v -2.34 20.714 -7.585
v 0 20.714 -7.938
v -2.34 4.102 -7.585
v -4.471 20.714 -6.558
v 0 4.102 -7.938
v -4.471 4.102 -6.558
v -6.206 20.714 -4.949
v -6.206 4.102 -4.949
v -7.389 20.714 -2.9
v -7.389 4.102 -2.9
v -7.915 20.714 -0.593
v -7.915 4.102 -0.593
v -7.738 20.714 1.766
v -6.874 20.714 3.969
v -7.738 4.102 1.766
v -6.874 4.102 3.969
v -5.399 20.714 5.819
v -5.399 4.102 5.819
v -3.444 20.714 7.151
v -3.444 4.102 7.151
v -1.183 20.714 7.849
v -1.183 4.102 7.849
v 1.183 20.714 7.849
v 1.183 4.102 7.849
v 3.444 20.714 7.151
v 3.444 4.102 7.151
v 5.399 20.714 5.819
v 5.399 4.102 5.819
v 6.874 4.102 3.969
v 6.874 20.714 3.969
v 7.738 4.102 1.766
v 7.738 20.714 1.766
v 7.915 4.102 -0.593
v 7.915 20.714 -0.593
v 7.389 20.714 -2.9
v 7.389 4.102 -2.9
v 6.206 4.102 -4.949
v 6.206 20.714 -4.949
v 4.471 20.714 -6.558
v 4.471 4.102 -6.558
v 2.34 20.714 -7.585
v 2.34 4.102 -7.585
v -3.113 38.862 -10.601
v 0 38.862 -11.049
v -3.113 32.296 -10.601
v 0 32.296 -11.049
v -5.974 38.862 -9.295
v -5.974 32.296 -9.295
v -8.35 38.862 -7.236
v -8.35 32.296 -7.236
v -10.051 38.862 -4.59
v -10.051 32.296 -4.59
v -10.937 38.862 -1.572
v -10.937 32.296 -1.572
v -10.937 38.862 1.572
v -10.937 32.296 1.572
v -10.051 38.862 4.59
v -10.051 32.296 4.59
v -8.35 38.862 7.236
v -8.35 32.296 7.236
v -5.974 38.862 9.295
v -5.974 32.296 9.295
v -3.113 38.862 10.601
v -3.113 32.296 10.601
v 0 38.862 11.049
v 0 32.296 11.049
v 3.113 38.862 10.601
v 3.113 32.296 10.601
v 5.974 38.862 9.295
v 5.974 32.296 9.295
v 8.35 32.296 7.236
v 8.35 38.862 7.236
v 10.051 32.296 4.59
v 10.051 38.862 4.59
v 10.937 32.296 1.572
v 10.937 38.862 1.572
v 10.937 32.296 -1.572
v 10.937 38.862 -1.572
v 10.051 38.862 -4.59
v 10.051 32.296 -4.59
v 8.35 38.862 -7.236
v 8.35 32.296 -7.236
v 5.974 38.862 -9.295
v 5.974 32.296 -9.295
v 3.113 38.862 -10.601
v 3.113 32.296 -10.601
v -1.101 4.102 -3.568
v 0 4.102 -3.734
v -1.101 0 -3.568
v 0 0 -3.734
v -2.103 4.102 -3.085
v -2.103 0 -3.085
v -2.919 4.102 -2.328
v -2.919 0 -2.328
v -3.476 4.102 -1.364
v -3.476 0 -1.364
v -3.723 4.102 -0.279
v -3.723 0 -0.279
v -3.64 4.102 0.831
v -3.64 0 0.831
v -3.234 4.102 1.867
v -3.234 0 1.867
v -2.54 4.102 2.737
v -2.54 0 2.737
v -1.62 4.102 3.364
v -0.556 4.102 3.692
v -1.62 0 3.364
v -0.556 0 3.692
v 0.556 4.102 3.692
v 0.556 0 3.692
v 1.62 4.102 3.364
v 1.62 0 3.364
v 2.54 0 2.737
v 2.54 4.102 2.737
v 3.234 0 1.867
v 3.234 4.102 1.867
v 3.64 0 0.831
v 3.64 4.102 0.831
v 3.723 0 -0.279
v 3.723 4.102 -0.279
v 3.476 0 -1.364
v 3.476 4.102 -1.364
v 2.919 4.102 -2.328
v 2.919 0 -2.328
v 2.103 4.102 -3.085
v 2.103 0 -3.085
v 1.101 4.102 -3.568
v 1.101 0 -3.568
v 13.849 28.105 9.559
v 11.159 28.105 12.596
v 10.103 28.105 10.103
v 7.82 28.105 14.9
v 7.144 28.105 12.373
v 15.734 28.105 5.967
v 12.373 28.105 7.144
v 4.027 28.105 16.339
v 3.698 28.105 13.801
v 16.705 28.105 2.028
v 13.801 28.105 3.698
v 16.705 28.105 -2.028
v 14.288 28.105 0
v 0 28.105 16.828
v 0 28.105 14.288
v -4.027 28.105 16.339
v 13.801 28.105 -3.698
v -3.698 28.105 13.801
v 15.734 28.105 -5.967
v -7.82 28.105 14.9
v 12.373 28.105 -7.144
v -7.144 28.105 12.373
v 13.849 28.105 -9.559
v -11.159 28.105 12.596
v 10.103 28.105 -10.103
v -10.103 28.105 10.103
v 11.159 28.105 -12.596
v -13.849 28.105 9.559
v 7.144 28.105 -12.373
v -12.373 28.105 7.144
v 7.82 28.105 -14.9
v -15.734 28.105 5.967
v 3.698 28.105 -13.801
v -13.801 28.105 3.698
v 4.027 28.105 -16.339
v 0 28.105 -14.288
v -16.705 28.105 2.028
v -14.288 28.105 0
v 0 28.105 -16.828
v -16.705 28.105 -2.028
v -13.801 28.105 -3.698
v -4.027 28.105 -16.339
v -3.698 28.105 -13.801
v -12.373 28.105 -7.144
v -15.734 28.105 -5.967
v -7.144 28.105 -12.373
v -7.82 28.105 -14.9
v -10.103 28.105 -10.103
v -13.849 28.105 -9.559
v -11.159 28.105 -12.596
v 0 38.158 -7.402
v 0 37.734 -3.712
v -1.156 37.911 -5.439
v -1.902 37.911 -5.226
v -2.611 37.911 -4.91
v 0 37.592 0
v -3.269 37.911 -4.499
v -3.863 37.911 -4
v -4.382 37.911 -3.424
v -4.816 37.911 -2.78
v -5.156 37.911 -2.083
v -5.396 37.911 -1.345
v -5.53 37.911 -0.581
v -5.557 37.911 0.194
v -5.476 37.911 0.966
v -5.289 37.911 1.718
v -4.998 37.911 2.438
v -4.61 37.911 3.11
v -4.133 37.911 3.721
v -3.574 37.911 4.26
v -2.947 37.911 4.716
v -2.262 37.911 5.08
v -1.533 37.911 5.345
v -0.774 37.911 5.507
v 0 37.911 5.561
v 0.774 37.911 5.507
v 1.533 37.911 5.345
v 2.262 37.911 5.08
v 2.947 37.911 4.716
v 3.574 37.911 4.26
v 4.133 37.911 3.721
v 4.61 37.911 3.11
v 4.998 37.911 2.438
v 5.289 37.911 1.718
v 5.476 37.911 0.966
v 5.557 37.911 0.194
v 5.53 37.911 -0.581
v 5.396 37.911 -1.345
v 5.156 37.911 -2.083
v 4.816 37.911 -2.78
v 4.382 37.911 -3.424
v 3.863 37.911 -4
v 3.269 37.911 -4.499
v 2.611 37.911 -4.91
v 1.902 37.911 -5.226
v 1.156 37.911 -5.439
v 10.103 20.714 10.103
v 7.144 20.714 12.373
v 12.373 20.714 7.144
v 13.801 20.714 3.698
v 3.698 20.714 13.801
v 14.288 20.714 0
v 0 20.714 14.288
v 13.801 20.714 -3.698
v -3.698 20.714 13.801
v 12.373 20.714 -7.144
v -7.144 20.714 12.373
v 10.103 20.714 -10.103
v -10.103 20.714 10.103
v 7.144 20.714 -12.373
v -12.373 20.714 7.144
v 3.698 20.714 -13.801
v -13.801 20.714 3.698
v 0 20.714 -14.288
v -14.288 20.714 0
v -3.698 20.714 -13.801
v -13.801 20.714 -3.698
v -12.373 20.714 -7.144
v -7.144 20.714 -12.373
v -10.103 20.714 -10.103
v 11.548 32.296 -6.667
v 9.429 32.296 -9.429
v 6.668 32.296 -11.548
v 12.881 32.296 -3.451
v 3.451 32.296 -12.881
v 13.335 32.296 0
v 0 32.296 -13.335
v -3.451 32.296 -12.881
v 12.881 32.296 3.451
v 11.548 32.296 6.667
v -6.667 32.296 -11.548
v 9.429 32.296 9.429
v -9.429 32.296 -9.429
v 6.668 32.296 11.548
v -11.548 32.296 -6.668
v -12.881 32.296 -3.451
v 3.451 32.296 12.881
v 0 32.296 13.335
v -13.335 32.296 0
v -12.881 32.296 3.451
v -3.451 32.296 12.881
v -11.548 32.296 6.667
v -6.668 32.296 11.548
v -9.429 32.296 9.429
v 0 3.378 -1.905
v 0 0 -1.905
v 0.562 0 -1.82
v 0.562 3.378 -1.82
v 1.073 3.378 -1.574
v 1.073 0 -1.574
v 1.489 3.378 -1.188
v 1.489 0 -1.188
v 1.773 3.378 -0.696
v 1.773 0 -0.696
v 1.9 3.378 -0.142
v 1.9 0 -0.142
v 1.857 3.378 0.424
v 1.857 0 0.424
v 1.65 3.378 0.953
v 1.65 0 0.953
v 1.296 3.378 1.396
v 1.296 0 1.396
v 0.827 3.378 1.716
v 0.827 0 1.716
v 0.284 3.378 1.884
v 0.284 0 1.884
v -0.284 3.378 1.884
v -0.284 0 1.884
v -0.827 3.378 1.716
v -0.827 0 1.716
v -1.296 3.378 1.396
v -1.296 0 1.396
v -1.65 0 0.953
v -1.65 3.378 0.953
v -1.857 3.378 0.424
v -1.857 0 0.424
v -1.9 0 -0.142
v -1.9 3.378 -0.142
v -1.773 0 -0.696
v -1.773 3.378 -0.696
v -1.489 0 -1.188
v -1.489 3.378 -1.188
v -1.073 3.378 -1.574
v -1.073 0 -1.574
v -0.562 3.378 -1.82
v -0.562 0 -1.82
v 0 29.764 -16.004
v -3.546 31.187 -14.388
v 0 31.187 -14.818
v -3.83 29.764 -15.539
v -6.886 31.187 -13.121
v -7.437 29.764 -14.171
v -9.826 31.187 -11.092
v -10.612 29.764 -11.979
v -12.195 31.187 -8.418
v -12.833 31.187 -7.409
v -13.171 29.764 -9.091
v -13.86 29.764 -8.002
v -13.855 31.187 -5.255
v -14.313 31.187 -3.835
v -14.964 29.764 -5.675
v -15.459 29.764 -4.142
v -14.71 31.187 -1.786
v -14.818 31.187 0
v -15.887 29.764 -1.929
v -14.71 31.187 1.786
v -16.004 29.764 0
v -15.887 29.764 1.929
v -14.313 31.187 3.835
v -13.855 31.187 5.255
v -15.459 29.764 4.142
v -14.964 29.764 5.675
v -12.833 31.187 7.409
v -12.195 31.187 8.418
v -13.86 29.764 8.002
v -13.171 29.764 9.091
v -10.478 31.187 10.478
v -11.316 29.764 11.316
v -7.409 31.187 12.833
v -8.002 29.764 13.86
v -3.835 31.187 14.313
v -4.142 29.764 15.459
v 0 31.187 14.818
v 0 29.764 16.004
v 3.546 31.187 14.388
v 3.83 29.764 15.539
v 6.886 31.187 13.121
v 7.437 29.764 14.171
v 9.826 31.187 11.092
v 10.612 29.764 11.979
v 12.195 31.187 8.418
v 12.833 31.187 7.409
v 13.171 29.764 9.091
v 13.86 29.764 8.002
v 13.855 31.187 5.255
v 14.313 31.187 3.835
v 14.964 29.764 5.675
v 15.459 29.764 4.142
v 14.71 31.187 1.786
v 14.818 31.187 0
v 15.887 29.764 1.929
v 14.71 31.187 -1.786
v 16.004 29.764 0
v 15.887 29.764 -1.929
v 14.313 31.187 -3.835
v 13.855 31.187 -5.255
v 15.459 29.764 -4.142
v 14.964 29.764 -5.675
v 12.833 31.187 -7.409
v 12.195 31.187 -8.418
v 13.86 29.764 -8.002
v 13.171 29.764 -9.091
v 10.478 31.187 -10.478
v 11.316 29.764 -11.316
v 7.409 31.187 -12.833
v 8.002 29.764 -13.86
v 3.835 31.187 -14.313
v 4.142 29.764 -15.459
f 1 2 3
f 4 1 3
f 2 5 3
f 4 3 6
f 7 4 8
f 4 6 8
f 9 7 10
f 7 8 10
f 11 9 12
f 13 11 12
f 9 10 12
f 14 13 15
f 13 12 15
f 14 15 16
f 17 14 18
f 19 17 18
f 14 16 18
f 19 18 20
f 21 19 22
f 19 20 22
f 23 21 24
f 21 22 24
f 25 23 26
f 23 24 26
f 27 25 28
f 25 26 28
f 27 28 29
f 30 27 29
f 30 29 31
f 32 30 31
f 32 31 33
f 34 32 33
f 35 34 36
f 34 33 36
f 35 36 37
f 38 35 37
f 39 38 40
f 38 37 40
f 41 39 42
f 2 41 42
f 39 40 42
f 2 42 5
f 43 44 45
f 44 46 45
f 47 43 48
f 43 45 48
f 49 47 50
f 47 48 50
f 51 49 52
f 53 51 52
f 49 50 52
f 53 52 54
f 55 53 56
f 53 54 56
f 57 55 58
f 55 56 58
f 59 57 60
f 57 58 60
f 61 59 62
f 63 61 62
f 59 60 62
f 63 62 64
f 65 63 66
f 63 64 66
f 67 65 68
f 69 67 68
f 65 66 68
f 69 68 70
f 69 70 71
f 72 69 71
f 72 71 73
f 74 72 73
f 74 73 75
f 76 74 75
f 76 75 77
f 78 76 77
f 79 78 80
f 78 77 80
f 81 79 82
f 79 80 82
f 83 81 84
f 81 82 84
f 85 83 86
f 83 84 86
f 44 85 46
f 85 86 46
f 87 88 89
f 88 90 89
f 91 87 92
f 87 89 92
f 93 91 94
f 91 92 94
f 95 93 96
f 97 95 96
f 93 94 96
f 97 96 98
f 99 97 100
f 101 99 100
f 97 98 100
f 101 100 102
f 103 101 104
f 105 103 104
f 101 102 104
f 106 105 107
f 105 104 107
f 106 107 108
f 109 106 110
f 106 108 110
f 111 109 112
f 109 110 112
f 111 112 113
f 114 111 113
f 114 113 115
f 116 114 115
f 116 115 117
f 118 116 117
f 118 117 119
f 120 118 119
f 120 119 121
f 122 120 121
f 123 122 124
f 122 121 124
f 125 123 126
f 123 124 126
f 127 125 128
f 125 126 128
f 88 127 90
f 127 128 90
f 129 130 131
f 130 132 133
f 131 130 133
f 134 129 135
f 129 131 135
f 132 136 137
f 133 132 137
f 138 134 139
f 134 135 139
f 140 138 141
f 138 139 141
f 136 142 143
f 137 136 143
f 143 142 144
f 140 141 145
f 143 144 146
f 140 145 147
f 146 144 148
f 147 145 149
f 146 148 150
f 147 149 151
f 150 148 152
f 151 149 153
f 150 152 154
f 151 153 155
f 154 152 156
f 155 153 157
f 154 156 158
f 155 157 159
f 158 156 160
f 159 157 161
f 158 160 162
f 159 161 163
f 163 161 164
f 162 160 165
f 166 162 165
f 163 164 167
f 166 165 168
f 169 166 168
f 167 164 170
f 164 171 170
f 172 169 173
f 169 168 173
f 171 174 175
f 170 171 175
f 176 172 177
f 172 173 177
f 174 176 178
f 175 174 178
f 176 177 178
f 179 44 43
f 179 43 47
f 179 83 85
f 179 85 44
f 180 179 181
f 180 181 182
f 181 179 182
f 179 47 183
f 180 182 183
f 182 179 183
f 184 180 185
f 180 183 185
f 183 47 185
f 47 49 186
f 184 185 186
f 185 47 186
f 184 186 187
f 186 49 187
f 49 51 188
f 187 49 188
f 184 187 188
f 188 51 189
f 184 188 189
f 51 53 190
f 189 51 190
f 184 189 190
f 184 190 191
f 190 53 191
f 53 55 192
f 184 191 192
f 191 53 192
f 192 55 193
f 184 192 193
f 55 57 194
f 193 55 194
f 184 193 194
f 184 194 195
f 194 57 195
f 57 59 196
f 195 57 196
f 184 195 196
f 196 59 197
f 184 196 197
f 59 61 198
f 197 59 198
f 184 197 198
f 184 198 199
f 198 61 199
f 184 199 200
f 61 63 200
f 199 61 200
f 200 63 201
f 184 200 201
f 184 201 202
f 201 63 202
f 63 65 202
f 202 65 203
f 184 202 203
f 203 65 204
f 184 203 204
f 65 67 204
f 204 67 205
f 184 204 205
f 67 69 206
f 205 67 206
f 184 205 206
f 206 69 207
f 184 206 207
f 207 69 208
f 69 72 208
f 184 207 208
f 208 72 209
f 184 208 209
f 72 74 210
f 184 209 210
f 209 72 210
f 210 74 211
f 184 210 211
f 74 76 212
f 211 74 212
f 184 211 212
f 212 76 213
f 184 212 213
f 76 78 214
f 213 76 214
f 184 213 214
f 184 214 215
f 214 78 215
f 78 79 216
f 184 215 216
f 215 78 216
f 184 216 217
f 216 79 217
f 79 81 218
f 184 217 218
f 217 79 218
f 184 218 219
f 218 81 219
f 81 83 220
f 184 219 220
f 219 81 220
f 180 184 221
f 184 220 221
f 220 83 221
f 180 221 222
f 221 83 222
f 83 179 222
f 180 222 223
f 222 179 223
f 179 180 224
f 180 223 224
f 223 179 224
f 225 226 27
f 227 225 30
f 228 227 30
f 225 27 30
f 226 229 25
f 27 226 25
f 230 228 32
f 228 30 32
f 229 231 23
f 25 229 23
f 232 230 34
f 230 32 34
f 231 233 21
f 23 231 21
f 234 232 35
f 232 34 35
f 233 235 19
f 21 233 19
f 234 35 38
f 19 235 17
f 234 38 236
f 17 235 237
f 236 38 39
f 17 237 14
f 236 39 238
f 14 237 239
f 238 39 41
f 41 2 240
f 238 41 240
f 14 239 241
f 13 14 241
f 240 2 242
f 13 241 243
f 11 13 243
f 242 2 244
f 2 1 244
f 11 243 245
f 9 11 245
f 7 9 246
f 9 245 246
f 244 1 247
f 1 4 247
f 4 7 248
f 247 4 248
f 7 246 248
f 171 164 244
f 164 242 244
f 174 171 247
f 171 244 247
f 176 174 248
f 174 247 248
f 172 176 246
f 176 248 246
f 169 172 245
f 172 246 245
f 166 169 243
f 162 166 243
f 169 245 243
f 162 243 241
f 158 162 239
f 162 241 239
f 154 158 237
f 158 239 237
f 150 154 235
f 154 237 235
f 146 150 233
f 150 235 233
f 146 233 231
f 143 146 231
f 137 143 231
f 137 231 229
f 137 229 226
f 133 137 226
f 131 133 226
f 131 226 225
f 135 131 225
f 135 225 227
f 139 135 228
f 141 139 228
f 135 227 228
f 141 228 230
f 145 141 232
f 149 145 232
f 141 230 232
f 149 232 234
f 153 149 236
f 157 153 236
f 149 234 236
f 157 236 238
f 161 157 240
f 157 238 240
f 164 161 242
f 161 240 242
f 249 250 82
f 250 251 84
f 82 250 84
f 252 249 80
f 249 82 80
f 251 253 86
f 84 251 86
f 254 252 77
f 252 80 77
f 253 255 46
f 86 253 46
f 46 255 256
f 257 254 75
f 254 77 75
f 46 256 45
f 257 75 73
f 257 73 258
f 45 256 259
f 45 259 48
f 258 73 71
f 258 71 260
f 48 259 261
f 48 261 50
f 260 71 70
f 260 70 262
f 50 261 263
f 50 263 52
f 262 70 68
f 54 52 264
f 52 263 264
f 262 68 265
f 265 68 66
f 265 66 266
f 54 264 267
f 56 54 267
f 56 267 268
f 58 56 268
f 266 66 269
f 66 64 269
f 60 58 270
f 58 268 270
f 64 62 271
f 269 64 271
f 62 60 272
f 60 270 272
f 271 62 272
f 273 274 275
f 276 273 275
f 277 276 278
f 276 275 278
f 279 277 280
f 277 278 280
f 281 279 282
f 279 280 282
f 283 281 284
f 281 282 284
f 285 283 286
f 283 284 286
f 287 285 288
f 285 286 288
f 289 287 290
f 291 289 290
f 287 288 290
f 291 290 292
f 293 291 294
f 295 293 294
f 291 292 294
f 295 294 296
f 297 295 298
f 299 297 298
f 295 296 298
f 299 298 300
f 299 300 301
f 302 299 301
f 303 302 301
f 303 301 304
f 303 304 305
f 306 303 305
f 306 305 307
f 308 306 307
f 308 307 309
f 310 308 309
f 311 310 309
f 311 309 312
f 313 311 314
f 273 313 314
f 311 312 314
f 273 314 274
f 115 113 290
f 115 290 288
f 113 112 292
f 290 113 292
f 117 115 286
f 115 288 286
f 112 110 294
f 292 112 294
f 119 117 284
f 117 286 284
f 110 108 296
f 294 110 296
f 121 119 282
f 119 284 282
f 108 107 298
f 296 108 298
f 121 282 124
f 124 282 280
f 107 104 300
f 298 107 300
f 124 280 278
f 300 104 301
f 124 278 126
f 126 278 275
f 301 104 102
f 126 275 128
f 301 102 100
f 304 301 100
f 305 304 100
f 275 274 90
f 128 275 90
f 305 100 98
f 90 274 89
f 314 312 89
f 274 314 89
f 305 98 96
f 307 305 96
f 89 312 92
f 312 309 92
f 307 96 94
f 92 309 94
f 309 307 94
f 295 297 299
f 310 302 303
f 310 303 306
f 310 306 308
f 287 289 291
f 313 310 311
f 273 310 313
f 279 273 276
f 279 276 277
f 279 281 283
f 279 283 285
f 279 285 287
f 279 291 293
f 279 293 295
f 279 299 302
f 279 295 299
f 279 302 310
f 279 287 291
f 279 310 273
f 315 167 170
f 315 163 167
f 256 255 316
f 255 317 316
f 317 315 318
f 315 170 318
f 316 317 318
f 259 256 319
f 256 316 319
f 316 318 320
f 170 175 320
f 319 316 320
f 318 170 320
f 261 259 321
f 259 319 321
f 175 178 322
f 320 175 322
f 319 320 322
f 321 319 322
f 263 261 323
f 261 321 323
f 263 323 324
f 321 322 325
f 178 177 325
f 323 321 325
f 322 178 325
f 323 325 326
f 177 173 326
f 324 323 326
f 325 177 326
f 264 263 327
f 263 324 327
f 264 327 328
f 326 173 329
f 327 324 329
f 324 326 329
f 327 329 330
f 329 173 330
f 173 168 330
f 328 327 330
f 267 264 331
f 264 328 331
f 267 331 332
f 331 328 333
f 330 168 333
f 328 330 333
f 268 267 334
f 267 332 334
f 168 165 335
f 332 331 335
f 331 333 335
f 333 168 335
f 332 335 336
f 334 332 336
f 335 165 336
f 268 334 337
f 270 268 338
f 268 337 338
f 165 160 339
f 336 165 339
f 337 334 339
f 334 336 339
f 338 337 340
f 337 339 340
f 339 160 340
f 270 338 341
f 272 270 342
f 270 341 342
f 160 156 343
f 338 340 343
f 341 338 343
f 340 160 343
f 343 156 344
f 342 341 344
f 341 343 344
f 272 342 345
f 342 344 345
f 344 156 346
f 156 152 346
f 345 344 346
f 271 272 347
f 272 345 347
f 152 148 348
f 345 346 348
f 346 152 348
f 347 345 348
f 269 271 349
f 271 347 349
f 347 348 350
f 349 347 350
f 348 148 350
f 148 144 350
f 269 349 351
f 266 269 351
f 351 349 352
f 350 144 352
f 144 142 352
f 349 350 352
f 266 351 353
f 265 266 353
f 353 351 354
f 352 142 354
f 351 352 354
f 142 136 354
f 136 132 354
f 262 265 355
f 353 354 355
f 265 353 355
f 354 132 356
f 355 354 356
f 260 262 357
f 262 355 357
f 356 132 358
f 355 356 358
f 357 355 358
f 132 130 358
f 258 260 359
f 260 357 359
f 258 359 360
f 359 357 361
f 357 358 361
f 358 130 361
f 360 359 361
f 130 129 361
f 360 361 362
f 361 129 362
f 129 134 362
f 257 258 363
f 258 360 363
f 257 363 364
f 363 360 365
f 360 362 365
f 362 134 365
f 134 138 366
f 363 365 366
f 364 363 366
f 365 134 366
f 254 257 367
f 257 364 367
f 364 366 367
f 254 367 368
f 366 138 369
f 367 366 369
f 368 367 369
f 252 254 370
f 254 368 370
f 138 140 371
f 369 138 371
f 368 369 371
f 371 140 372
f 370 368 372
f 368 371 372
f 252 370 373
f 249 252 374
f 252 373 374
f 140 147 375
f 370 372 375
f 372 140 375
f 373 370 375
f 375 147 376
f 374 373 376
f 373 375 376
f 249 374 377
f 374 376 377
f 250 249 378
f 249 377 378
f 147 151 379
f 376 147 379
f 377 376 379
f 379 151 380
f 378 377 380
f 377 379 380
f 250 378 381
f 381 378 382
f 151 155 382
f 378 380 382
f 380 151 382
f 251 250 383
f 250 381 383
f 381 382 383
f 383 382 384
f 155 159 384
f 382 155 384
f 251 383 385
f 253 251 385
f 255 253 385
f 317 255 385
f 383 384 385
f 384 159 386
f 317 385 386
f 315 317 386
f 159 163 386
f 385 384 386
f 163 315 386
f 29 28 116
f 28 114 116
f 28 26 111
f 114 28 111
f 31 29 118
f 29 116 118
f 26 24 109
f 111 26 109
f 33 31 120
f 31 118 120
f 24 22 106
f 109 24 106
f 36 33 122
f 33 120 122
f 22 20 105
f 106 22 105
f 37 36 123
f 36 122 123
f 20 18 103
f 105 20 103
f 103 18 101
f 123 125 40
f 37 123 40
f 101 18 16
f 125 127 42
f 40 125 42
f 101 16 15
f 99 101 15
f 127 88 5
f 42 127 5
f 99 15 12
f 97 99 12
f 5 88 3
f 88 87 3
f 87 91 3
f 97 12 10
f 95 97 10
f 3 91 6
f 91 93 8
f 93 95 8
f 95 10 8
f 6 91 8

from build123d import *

# Parameters (mm, degrees)
SKETCH2_R          = 1.905
CUT_EXTRUDE1_DEPTH = 3.3782


with BuildPart() as part:
    # Sketch1 → Revolve1 (revolve)
    with BuildSketch(Plane.XY, mode=Mode.PRIVATE) as revolve1_sk:
        with BuildLine():
            Line((0, 0), (0, 37.592))
            ThreePointArc((0, 37.592), (5.560874504, 37.910541815), (11.049, 38.862))
            Line((11.049, 38.862), (11.049, 32.2961))
            Line((11.049, 32.2961), (13.335, 32.2961))
            ThreePointArc((13.335, 32.2961), (15.452618981, 30.510074151), (16.8275, 28.1051))
            Line((16.8275, 28.1051), (14.2875, 28.1051))
            Line((14.2875, 28.1051), (14.2875, 20.7137))
            Line((14.2875, 20.7137), (7.9375, 20.7137))
            Line((7.9375, 20.7137), (7.9375, 4.1021))
            Line((7.9375, 4.1021), (3.7338, 4.1021))
            Line((3.7338, 4.1021), (3.7338, 0))
            Line((3.7338, 0), (0, 0))
        make_face()
    revolve(revolve1_sk.sketch.rotate(Axis((0, 0, 0), (0, 1, 0)), 90), axis=Axis((0, 0, 0), (0, 1, 0)))

    # Sketch2 → Cut-Extrude1 (cut)
    with BuildSketch(Plane.XZ):
        with Locations(Location((0, 0, 0), (0, 0, 270))):
            Circle(SKETCH2_R)
    extrude(amount=-CUT_EXTRUDE1_DEPTH, mode=Mode.SUBTRACT)


solid = part.part
